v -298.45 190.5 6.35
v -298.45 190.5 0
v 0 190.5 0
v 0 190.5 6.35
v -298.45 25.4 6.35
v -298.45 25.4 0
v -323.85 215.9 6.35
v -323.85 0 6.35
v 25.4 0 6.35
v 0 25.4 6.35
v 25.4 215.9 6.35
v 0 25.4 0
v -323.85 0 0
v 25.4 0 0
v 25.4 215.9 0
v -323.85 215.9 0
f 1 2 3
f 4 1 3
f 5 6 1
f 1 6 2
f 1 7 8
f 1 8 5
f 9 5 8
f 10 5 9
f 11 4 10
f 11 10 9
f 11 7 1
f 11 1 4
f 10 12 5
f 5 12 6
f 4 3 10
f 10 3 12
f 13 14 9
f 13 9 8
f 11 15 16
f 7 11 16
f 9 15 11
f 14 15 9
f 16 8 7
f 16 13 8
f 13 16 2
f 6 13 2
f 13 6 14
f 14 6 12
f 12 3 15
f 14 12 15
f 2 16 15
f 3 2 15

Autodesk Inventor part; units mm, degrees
ref_plane "YZ Plane" through (0, 0, 0) normal (1, 0, 0) x (0, 1, 0)
ref_plane "XZ Plane" through (0, 0, 0) normal (0, 1, 0) x (-1, 0, 0)
ref_plane "XY Plane" through (0, 0, 0) normal (0, 0, 1) x (1, 0, 0)
sketch "Sketch1" plane through (0, 0, 0) normal (0, 0, 1) x (1, 0, 0)
  line L0 (0, 0) -> (0, 25.4) projected
  line L1 (0, 25.4) -> (-298.45, 25.4) projected
  line L2 (-298.45, 0) -> (-298.45, 25.4) projected
  line L3 (0, 0) -> (-298.45, 0) projected
  line L4 (-323.85, 0) -> (-298.45, 0) projected
  line L5 (-298.45, 0) -> (-298.45, 215.9) projected
  line L6 (-323.85, 215.9) -> (-298.45, 215.9) projected
  line L7 (-323.85, 0) -> (-323.85, 215.9) projected
  line L8 (-298.45, 215.9) -> (-298.45, 190.5) projected
  line L9 (-298.45, 190.5) -> (0, 190.5) projected
  line L10 (0, 215.9) -> (0, 190.5) projected
  line L11 (-298.45, 215.9) -> (0, 215.9) projected
  line L12 (25.4, 215.9) -> (0, 215.9) projected
  line L13 (0, 215.9) -> (0, 0) projected
  line L14 (25.4, 0) -> (0, 0) projected
  line L15 (25.4, 215.9) -> (25.4, 0) projected
  line L16 (-323.85, 0) -> (25.4, 0)
  line L17 (25.4, 0) -> (25.4, 215.9)
  line L18 (25.4, 215.9) -> (-323.85, 215.9)
  line L19 (-323.85, 215.9) -> (-323.85, 0)
  line L20 (0, 25.4) -> (-298.45, 25.4)
  line L21 (-298.45, 25.4) -> (-298.45, 190.5)
  line L22 (-298.45, 190.5) -> (0, 190.5)
  line L23 (0, 190.5) -> (0, 25.4)
  dimension "d0" = 25.4
  dimension "d1" = 25.4
  dimension "d2" = 215.9
  dimension "d3" = 25.4
  dimension "d4" = 25.4
extrude "Extrusion1" add sketch "Sketch1" along normal blind 6.35 contours L3 L2 L1 L0 | L0 L13 L10 L12 L15 L14 | L4 L7 L6 L5 L2 | L9 L5 L11 L10
properties part number "Velcro strip"
